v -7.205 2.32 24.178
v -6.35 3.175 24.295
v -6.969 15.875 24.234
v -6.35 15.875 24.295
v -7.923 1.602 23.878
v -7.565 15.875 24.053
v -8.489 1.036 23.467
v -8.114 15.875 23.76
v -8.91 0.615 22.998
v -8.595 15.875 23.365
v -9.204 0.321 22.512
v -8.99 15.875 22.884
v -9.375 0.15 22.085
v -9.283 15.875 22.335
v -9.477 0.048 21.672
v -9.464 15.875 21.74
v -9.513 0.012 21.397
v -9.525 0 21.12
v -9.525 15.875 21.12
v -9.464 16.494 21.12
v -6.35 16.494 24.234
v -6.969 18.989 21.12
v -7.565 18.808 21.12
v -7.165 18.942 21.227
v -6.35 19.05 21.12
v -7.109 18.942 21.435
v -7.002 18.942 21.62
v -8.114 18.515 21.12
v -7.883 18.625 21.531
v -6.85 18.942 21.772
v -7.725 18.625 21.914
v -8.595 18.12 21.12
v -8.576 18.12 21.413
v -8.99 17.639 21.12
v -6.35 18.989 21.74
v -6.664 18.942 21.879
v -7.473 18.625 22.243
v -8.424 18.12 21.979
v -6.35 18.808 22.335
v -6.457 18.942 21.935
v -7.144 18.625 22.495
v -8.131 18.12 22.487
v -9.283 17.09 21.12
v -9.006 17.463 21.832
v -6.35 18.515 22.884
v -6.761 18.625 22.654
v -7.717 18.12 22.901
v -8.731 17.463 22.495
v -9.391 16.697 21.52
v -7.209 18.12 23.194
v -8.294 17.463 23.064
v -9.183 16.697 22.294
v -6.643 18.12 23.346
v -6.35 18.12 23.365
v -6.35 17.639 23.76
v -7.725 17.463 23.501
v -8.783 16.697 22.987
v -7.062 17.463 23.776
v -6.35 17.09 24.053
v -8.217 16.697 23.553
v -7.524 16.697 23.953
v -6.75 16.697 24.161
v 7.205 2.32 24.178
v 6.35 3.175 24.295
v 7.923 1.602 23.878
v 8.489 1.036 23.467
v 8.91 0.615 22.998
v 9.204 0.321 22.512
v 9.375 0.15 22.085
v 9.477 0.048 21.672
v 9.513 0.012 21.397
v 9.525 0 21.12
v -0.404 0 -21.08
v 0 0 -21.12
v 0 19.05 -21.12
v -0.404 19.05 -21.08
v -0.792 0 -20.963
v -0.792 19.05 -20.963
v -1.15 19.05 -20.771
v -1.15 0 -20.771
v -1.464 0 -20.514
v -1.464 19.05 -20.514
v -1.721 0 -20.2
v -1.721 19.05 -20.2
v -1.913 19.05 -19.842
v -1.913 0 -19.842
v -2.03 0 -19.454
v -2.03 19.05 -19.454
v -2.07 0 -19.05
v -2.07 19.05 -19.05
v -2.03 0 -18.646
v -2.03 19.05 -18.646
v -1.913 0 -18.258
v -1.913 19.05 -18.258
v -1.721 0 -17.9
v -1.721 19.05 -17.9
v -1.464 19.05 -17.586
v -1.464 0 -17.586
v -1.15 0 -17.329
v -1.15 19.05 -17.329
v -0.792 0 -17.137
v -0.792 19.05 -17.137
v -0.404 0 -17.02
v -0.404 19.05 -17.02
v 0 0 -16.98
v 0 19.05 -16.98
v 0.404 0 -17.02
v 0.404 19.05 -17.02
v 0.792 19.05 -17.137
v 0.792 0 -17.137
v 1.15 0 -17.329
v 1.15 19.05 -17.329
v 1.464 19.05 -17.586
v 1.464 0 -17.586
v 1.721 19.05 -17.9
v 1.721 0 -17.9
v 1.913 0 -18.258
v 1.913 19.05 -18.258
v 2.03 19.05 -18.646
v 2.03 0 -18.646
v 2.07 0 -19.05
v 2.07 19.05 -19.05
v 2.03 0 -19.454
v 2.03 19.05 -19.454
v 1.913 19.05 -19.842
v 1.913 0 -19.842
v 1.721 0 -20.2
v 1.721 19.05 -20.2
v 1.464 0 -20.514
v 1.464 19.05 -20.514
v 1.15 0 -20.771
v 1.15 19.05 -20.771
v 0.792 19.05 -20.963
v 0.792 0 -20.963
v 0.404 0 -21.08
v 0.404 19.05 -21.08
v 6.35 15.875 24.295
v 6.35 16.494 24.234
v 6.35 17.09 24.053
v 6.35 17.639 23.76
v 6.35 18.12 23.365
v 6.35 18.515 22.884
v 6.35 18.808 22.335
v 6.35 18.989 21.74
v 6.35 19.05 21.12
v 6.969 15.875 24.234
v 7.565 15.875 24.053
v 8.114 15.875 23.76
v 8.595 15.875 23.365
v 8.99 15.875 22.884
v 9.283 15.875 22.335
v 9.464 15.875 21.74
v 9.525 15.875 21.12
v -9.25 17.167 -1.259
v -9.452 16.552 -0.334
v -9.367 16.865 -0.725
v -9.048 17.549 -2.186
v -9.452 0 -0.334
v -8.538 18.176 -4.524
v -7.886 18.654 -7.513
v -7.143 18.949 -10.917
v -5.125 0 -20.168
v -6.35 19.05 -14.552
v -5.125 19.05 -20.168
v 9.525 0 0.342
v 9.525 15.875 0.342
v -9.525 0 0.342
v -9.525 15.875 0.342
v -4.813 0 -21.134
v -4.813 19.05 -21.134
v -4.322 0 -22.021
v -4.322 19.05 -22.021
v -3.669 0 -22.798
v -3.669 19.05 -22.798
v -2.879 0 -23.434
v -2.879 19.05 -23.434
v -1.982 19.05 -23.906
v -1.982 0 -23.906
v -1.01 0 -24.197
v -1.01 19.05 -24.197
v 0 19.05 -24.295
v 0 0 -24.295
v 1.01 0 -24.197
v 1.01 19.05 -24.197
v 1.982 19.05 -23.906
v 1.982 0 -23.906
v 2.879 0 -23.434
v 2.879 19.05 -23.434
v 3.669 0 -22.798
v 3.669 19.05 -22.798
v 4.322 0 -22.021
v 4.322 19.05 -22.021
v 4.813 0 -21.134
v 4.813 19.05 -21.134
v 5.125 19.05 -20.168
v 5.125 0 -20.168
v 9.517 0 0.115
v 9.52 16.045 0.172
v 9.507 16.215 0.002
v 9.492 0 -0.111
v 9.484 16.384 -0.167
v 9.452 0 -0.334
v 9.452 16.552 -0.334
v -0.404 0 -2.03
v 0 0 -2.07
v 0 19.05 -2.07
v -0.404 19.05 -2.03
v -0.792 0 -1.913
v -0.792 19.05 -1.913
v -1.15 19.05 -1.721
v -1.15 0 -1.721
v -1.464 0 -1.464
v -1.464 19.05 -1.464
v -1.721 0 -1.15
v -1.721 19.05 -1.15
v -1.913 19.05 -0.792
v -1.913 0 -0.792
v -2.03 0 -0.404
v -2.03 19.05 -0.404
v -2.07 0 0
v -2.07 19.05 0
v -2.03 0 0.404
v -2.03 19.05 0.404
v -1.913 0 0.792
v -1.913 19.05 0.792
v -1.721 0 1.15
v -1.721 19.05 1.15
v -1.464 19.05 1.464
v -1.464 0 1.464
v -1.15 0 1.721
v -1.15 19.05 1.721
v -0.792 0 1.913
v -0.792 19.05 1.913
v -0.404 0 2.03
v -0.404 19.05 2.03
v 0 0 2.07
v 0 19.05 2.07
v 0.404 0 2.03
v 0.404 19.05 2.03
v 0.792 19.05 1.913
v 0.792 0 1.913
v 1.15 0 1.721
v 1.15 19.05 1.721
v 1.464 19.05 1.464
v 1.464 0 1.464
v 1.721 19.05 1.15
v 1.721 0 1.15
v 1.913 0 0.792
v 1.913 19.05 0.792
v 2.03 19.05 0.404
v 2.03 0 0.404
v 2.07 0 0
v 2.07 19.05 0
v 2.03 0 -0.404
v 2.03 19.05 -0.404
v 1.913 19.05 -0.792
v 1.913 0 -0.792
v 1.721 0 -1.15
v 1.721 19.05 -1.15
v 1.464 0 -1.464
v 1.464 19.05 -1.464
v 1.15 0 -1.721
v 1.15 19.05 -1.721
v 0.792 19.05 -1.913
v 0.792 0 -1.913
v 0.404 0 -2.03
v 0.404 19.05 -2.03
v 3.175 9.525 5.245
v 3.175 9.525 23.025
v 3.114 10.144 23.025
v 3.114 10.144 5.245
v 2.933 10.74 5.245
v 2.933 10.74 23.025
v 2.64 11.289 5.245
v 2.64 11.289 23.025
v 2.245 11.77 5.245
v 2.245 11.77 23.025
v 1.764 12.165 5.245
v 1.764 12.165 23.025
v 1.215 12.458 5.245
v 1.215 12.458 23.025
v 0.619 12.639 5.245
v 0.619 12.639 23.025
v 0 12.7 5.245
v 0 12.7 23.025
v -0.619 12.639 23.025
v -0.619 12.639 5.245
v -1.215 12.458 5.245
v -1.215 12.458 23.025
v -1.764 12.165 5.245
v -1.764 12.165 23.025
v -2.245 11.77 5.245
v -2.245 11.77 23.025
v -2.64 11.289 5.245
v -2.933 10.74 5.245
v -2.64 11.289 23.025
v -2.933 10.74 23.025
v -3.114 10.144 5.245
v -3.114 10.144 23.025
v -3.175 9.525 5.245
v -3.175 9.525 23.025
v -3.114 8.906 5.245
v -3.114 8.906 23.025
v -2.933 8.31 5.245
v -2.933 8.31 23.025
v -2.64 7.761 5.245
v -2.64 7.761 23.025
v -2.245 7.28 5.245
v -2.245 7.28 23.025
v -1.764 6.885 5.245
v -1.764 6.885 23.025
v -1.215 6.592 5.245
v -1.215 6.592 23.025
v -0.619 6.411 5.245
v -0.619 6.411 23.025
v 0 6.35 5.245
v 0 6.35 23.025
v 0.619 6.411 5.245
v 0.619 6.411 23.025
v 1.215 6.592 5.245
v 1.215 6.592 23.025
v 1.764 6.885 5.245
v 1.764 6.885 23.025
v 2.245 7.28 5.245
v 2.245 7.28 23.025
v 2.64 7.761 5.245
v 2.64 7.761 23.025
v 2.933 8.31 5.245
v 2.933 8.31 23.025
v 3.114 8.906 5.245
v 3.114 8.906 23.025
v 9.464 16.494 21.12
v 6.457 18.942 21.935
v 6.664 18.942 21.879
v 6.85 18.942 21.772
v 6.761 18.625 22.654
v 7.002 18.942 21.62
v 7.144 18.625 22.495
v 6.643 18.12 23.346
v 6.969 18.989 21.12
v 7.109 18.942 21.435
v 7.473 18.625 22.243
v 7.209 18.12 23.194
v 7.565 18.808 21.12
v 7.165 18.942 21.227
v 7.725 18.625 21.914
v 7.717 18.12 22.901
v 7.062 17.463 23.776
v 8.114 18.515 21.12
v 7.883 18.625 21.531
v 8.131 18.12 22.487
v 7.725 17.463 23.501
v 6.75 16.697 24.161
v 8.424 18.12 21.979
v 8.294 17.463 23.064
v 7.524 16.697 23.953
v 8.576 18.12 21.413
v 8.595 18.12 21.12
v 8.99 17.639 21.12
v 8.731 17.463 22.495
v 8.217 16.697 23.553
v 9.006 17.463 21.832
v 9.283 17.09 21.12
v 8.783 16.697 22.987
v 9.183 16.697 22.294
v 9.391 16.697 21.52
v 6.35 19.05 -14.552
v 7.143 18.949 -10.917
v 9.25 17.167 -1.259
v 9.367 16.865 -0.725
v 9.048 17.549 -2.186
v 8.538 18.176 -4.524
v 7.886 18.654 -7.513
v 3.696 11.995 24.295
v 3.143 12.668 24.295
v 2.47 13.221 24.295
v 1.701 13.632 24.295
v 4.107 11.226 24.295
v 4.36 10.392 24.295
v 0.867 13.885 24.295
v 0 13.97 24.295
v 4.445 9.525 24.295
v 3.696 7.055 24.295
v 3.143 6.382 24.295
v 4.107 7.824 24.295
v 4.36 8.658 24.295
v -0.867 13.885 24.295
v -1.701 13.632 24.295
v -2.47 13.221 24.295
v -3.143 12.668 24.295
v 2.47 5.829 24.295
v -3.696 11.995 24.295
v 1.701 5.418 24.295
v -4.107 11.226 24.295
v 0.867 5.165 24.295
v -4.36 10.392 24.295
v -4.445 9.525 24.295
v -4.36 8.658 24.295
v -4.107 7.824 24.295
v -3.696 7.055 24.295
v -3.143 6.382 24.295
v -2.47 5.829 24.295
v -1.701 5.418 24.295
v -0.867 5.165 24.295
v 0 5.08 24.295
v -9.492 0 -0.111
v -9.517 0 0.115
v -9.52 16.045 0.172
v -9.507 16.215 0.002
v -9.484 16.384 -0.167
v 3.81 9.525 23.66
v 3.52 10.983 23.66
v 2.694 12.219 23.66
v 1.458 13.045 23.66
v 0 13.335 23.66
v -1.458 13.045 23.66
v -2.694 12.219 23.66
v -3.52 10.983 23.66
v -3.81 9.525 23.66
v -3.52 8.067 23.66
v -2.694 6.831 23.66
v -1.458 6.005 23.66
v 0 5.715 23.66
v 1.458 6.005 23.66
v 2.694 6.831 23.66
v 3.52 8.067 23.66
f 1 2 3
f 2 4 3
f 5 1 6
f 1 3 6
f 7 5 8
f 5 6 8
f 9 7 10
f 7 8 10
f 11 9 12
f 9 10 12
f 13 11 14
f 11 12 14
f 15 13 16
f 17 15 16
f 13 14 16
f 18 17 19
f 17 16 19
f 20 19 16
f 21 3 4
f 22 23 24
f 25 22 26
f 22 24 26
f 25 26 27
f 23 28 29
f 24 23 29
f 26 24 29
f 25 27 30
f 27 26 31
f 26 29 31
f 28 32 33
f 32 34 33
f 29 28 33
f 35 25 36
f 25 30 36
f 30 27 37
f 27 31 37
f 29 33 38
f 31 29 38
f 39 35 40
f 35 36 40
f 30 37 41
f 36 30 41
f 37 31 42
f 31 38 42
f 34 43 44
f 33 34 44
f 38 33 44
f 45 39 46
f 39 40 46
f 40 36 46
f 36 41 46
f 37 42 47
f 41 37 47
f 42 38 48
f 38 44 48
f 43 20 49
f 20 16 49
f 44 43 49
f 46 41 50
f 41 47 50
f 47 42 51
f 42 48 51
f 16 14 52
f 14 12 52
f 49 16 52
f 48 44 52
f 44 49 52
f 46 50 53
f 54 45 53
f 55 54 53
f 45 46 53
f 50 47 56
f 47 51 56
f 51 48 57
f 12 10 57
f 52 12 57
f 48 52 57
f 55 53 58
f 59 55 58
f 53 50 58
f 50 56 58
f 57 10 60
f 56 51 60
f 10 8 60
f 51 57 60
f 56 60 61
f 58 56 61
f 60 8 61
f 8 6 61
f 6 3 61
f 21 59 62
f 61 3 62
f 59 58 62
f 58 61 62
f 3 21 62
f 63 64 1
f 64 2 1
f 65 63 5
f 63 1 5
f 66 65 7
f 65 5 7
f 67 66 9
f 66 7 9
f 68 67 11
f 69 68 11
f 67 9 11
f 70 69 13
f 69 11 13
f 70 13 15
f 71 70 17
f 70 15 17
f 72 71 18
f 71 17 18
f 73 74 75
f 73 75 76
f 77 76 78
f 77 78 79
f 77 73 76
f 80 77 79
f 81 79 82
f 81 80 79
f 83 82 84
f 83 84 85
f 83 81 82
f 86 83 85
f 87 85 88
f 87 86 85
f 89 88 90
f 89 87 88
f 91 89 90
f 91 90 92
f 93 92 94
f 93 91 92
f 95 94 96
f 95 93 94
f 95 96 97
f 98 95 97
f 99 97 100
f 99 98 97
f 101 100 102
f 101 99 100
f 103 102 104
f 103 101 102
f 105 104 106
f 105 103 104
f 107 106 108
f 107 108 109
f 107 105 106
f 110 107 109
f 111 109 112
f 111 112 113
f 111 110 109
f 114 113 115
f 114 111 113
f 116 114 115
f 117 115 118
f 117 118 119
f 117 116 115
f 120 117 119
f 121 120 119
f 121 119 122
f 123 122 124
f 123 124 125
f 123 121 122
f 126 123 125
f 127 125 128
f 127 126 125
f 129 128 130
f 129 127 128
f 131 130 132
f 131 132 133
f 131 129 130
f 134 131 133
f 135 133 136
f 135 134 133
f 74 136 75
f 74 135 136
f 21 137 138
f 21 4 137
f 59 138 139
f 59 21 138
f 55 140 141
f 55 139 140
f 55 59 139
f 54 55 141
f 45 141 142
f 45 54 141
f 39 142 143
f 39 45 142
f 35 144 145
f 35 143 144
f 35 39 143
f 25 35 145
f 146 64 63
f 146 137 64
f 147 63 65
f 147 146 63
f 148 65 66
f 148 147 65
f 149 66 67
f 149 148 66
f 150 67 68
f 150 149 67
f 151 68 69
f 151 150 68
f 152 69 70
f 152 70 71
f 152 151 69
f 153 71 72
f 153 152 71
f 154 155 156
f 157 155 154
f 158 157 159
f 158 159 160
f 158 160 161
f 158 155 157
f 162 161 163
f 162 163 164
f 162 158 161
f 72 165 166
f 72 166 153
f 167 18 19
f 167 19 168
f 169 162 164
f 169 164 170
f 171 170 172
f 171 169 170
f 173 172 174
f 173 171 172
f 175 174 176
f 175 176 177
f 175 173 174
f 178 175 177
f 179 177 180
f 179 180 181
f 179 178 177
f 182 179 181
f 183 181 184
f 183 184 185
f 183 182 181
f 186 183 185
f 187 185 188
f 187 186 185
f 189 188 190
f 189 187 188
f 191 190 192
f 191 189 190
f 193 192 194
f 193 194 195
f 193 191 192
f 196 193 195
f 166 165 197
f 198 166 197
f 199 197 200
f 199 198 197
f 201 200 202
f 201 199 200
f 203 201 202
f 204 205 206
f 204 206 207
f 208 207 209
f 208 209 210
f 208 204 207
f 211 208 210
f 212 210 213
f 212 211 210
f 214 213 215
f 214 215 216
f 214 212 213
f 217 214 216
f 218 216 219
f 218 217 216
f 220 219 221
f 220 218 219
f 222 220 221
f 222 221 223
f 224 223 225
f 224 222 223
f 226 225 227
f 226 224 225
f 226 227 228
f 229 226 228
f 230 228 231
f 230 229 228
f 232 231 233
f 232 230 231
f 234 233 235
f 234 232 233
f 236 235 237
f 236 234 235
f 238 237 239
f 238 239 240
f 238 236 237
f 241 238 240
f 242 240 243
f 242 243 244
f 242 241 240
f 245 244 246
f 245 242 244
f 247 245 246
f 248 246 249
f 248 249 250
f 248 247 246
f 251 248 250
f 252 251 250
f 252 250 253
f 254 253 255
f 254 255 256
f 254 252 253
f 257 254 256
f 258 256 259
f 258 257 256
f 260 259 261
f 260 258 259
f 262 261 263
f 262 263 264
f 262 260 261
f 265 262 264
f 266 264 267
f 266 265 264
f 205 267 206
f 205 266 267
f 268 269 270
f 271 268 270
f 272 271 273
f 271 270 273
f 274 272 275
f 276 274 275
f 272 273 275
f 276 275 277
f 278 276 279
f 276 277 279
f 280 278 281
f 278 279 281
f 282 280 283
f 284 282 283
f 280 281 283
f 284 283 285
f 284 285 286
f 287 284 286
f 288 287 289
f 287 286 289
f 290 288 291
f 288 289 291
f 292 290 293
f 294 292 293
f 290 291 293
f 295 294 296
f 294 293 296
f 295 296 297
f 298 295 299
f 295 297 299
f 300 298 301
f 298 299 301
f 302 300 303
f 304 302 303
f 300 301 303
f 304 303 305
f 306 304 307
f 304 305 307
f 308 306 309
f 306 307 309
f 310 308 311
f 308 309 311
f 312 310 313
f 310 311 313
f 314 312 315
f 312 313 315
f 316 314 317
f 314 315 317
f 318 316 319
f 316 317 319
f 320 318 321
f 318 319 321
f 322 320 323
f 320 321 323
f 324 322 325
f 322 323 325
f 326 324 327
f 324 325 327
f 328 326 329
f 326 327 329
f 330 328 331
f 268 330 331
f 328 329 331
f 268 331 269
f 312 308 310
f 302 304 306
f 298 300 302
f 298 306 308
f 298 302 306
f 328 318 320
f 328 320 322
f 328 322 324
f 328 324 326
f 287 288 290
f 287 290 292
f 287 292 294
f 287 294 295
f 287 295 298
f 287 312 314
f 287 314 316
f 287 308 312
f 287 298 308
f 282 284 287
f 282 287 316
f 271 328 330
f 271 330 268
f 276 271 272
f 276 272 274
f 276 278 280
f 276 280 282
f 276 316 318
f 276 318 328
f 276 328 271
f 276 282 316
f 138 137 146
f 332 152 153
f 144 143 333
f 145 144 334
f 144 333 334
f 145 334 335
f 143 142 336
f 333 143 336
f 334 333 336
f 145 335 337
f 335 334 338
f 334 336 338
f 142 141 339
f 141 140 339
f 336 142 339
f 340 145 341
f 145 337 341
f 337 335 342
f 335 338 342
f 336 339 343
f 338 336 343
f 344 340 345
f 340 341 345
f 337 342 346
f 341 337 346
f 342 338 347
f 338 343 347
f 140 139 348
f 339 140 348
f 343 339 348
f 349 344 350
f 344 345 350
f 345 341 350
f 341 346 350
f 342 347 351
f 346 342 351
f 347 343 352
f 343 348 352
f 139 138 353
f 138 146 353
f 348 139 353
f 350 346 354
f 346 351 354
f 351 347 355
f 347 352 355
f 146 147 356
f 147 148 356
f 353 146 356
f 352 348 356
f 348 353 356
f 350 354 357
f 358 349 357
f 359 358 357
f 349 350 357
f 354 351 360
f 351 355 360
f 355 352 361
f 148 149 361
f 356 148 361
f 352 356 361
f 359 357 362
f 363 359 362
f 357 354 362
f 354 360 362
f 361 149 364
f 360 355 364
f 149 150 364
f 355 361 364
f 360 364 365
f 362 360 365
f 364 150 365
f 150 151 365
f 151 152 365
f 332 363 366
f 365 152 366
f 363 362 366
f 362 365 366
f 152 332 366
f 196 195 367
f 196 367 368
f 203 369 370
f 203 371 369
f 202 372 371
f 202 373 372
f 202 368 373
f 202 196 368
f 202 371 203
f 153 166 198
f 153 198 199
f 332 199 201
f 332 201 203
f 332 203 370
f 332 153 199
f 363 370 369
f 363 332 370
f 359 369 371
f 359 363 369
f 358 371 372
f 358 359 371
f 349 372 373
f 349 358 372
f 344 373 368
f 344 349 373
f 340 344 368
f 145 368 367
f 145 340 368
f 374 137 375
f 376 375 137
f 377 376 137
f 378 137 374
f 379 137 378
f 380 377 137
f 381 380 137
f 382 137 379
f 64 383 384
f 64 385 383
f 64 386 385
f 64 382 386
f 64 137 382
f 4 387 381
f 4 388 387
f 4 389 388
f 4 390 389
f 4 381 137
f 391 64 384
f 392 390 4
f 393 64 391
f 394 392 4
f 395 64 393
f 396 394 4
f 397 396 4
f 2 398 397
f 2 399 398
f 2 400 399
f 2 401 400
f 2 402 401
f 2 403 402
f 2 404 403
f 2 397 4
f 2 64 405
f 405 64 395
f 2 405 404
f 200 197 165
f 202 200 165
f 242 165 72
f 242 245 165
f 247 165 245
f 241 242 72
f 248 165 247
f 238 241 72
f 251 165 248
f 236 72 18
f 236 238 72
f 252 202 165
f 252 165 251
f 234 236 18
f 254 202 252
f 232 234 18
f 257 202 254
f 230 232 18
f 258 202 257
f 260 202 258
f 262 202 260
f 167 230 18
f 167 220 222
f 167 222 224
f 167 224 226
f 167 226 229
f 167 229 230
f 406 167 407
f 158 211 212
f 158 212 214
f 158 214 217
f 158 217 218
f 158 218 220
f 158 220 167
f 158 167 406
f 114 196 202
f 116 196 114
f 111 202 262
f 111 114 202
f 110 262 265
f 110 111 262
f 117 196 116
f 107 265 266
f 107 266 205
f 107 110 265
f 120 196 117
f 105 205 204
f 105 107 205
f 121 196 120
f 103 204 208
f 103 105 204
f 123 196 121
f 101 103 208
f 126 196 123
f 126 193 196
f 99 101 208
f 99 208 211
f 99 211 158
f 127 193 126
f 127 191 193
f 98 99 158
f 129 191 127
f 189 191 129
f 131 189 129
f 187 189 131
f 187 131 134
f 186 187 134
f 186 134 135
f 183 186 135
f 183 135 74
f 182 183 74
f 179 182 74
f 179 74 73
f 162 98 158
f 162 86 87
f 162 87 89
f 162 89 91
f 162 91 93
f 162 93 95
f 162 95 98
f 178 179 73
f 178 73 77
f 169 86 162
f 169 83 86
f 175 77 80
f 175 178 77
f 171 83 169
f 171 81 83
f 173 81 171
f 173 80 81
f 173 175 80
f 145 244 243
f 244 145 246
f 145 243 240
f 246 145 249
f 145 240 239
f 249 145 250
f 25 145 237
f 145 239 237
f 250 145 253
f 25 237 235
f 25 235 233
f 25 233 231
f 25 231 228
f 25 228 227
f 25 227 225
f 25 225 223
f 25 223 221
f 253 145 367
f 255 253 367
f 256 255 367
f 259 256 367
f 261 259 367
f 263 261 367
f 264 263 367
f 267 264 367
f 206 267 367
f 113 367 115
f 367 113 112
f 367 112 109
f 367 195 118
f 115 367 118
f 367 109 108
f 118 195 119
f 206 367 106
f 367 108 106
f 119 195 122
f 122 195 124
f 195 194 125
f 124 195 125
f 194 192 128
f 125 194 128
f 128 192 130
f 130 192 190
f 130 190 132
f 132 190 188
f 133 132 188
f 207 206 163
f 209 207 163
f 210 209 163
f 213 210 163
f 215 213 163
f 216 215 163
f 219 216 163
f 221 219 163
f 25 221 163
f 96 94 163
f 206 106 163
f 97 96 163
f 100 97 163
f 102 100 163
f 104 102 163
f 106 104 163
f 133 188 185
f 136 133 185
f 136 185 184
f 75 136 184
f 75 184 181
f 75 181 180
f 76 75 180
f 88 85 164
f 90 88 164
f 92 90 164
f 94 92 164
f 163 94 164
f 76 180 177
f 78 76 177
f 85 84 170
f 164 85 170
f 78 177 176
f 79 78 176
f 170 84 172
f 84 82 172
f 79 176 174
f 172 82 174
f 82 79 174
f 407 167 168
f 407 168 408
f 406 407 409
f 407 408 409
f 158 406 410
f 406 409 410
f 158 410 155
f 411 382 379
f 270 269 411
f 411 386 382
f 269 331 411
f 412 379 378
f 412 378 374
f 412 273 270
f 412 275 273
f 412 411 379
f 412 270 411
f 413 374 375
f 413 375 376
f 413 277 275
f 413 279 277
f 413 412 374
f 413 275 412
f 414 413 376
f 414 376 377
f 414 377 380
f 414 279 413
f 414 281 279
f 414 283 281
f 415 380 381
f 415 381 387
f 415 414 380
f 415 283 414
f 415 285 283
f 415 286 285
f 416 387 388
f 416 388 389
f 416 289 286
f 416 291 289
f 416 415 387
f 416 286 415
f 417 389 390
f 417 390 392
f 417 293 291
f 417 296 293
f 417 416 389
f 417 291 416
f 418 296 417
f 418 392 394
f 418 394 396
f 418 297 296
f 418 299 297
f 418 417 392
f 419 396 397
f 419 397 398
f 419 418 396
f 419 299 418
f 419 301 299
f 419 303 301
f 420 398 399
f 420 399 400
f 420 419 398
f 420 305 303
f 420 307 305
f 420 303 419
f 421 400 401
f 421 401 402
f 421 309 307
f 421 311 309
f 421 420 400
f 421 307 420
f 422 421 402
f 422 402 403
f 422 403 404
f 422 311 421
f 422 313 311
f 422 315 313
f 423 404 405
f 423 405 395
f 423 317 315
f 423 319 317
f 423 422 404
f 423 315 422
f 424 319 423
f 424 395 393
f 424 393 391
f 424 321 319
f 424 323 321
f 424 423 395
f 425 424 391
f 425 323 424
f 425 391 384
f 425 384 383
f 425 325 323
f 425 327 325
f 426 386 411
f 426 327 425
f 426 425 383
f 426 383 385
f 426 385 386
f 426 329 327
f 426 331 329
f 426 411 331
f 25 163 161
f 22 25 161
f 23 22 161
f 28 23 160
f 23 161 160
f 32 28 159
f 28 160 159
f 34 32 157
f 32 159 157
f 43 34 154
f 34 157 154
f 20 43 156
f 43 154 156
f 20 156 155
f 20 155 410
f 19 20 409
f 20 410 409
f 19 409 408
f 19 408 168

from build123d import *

# Parameters (mm, degrees)
SKETCH2_R           = 2.0701
BOSS_EXTRUDE1_DEPTH = 19.05
SKETCH3_R           = 3.175
CUT_EXTRUDE1_DEPTH  = 19.05
CHAMFER1_SIZE       = 1.27
FILLET1_R           = 3.175


with BuildPart() as part:
    # Sketch2 → Boss-Extrude1 (new body)
    with BuildSketch(Plane(origin=(0, 0, 0), x_dir=(1, 0, 0), z_dir=(0, 1, 0))):
        with BuildLine():
            Line((9.525, -24.2951), (-9.525, -24.2951))
            Line((-9.525, -24.2951), (-9.525, 0))
            Line((-9.525, 0), (-5.12453766, 20.168117963))
            ThreePointArc((-5.12453766, 20.168117963), (0, 24.2951), (5.12453766, 20.168117963))
            Line((5.12453766, 20.168117963), (9.525, 0))
            Line((9.525, 0), (9.525, -24.2951))
        make_face()
        with Locations(Location((0, 0, 0), (0, 0, 90))):
            Circle(SKETCH2_R, mode=Mode.SUBTRACT)
        with Locations(Location((0, 19.05, 0), (0, 0, 90))):
            Circle(SKETCH2_R, mode=Mode.SUBTRACT)
    extrude(amount=BOSS_EXTRUDE1_DEPTH)

    # Sketch3 → Cut-Extrude1 (cut)
    with BuildSketch(Plane.XY.offset(24.2951)):
        with Locations((0, 9.525)):
            Circle(SKETCH3_R)
    extrude(amount=-CUT_EXTRUDE1_DEPTH, mode=Mode.SUBTRACT)

    # Chamfer1
    chamfer1_edges = [part.edges().sort_by_distance(p)[0] for p in [
        (-3.175, 9.525, 24.2951),
    ]]
    chamfer(chamfer1_edges, length=CHAMFER1_SIZE)

    # Fillet1
    fillet1_edges = [part.edges().sort_by_distance(p)[0] for p in [
        (9.525, 9.525, 0),
        (9.525, 9.525, 24.2951),
        (-9.525, 9.525, 24.2951),
        (-9.525, 9.525, 0),
        (-9.525, 19.05, 12.14755),
        (0, 19.05, 24.2951),
        (9.525, 19.05, 12.14755),
        (0, 0, 24.2951),
    ]]
    fillet(fillet1_edges, radius=FILLET1_R)


solid = part.part
